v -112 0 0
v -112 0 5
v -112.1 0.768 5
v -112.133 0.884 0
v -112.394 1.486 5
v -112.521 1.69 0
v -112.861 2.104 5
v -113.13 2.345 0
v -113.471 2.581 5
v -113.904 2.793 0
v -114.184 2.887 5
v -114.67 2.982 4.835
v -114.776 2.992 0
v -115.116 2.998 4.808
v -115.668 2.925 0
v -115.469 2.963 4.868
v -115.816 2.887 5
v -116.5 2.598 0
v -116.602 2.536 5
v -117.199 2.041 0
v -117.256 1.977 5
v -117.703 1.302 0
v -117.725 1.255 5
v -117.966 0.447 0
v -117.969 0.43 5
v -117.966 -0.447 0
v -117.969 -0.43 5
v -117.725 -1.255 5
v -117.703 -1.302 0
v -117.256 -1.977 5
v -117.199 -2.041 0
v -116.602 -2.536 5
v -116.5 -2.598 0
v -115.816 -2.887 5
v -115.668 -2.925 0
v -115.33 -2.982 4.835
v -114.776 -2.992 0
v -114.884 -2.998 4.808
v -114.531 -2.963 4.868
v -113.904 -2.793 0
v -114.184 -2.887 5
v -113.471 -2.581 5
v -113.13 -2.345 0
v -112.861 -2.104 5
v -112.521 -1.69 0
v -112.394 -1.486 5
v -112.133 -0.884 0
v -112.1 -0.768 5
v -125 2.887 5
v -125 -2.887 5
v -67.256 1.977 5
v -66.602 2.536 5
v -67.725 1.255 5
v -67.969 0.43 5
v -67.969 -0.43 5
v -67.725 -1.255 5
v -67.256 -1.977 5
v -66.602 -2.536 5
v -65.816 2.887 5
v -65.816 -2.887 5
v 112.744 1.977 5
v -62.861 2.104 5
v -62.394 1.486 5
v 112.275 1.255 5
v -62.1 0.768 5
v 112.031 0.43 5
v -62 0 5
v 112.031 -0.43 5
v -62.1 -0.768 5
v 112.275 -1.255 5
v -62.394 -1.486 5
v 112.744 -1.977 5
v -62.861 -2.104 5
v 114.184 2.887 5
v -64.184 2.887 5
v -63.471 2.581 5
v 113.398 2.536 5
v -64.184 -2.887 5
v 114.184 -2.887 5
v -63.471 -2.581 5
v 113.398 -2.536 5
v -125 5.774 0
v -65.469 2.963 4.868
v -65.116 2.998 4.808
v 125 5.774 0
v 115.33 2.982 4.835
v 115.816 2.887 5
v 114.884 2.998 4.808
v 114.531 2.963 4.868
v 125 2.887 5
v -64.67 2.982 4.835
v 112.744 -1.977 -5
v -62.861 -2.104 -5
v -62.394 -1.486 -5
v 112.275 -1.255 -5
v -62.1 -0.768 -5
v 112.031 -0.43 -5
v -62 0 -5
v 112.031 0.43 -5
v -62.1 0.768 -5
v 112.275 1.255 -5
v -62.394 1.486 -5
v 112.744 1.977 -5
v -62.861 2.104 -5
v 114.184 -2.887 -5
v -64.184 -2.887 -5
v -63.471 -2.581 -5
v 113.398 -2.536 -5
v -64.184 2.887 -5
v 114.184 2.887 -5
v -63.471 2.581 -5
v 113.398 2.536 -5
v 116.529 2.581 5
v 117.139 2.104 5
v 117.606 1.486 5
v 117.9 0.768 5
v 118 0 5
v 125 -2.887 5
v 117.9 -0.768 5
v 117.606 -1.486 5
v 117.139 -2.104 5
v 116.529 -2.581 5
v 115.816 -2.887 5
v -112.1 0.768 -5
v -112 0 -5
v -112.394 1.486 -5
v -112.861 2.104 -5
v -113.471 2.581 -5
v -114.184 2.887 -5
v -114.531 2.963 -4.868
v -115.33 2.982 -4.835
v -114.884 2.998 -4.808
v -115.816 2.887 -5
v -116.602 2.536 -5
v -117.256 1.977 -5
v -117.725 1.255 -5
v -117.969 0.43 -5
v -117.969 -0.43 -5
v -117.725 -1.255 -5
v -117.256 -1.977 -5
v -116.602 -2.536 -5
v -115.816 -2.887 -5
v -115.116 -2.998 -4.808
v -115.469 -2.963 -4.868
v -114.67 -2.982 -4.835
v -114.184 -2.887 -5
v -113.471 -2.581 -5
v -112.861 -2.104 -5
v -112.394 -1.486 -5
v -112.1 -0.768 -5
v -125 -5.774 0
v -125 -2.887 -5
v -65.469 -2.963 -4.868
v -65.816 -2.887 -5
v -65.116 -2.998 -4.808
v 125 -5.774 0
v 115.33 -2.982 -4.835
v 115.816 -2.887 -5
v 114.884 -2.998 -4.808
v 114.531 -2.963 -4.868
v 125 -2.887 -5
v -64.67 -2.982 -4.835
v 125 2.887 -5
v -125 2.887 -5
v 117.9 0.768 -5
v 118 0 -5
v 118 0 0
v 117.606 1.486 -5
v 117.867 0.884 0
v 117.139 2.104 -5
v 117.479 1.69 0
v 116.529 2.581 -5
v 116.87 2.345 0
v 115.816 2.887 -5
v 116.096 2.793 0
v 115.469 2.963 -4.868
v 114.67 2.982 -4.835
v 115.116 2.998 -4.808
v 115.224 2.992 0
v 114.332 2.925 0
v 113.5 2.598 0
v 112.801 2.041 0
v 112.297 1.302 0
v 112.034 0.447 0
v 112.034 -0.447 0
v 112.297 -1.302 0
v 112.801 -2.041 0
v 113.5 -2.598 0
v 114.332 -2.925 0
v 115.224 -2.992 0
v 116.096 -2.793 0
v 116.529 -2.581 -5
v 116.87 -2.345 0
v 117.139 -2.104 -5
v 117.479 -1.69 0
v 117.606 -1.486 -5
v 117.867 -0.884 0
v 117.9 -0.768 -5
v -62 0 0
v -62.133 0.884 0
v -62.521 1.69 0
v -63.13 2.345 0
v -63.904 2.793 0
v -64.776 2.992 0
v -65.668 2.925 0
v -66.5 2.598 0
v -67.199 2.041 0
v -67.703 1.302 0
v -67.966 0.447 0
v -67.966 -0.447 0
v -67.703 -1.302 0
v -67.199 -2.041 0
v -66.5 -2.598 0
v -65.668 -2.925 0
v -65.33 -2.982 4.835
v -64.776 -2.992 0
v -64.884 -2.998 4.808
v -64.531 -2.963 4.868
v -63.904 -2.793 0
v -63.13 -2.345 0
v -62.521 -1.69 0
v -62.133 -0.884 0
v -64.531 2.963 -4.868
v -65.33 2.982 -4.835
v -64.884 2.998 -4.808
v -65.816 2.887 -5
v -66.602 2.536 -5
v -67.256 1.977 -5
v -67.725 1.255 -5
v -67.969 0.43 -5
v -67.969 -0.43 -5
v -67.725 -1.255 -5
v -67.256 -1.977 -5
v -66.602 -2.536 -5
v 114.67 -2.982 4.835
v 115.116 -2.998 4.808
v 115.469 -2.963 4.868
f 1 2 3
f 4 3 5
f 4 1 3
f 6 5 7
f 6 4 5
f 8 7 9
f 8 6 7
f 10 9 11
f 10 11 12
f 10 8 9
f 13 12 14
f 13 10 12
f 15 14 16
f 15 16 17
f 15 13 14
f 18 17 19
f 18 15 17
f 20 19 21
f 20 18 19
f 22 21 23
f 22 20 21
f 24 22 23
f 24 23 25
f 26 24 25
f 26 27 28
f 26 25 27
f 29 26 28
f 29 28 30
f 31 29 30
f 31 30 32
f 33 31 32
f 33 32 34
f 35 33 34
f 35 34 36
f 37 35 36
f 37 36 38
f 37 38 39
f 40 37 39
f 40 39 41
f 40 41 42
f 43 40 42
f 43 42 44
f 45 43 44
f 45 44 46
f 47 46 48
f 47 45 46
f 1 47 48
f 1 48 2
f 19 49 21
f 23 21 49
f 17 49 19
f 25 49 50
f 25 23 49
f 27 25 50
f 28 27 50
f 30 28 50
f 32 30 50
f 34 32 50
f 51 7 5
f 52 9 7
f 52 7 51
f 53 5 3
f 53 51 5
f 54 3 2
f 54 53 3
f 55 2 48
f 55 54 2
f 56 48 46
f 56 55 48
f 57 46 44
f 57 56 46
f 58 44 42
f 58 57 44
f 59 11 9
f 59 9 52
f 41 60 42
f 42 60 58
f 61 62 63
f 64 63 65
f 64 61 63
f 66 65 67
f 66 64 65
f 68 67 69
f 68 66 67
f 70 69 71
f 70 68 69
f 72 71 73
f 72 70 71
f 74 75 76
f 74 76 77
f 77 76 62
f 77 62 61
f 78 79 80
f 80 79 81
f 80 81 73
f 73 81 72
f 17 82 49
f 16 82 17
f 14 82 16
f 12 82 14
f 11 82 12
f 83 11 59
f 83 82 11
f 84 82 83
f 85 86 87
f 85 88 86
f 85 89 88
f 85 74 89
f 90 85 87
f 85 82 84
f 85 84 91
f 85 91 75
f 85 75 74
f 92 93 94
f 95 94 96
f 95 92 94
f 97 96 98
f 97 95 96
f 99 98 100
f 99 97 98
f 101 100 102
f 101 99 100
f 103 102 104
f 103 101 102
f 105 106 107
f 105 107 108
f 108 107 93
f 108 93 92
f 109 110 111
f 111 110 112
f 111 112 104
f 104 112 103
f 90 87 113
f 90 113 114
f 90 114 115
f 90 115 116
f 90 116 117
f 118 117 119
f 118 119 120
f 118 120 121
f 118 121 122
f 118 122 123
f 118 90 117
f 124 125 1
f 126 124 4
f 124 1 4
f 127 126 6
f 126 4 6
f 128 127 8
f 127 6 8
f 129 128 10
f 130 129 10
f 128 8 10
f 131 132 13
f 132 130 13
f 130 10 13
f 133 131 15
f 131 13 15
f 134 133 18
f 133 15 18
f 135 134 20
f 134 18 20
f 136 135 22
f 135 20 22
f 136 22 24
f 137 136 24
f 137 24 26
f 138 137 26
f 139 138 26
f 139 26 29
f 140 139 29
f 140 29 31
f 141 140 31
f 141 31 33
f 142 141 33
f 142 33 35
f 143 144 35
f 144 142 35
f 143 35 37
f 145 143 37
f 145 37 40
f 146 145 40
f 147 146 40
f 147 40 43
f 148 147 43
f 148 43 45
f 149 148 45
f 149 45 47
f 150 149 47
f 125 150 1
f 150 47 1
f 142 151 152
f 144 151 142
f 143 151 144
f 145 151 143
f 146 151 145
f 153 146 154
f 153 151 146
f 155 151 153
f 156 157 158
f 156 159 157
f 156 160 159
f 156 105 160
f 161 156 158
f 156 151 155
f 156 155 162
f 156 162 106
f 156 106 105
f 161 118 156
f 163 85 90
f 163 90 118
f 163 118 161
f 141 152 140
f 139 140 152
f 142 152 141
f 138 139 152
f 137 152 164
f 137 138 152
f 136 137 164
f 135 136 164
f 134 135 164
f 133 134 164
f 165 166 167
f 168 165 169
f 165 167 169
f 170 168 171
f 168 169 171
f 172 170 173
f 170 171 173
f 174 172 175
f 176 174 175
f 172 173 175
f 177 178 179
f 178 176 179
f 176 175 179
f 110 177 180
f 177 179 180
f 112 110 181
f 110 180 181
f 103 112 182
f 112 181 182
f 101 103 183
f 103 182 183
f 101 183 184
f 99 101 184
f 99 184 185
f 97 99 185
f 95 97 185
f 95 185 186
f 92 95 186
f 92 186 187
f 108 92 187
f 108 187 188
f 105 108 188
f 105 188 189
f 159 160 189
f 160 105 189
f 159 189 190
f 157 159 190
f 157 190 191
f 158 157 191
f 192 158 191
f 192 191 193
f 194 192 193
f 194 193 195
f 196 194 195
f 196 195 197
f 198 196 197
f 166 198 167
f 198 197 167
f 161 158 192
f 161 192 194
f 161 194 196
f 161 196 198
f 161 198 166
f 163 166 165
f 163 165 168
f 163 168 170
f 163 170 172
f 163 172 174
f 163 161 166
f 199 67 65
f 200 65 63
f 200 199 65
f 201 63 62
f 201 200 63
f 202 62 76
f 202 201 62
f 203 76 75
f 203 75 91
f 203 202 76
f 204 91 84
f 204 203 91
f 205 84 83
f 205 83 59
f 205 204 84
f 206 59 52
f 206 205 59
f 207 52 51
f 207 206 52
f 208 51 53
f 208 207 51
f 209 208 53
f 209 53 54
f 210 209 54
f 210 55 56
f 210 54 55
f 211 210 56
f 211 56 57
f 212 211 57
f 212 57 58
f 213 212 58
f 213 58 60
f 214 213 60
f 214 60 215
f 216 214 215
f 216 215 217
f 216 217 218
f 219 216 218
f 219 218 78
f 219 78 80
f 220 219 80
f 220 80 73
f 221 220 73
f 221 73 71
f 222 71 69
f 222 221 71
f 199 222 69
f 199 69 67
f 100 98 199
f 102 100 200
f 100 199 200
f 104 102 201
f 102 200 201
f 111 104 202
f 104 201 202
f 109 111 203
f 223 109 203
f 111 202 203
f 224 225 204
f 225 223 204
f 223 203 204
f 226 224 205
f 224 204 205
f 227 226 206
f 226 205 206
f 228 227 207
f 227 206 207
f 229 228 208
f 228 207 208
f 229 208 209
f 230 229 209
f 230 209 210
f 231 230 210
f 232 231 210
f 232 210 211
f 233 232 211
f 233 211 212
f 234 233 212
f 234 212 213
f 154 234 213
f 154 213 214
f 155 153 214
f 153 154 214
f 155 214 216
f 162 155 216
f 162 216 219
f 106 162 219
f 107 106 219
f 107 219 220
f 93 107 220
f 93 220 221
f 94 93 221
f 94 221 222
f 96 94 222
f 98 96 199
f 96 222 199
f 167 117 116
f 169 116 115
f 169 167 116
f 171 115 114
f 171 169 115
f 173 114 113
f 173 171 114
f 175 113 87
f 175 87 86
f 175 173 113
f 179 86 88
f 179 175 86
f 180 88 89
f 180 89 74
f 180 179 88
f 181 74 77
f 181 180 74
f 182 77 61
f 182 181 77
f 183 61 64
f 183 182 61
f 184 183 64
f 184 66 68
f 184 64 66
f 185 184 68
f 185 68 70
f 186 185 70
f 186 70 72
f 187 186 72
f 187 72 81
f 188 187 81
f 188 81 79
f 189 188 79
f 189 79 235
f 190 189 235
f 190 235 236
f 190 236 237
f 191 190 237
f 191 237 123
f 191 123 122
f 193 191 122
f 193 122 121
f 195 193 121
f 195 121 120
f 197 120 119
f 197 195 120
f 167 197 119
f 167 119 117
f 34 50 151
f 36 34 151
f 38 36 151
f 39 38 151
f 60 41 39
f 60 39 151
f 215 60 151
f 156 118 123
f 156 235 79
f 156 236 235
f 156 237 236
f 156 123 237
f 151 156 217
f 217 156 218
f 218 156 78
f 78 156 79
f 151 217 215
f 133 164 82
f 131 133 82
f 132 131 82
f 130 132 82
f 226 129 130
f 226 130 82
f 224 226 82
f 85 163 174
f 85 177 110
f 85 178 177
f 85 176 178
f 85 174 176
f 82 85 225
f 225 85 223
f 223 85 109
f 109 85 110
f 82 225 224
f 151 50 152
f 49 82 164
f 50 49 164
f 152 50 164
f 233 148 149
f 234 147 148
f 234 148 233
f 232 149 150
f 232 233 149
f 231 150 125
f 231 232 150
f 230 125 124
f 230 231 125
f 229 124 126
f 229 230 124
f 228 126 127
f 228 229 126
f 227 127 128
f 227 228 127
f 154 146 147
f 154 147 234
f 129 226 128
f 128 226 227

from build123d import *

# Parameters (mm, degrees)
BOSS_EXTRUDE1_DEPTH     = 125
SKETCH2_R               = 3
CUT_EXTRUDE1_DEPTH      = 6
CUT_EXTRUDE1_DEPTH_BACK = 6


with BuildPart() as part:
    # Sketch1 → Boss-Extrude1 (new body, symmetric)
    with BuildSketch(Plane(origin=(0, 0, 0), x_dir=(0, 0, -1), z_dir=(1, 0, 0))):
        Polygon((0, 5.773502692), (-5, 2.886751346), (-5, -2.886751346), (0, -5.773502692), (5, -2.886751346), (5, 2.886751346), align=None)
    extrude(amount=BOSS_EXTRUDE1_DEPTH, both=True)

    # Sketch2 → Cut-Extrude1 (cut, two sides)
    with BuildSketch(Plane.XY) as cut_extrude1_sk:
        with Locations((115, 0)):
            Circle(SKETCH2_R)
        with Locations((-115, 0)):
            Circle(SKETCH2_R)
        with Locations((-65, 0)):
            Circle(SKETCH2_R)
    extrude(amount=CUT_EXTRUDE1_DEPTH, mode=Mode.SUBTRACT)
    extrude(cut_extrude1_sk.sketch, amount=-CUT_EXTRUDE1_DEPTH_BACK, mode=Mode.SUBTRACT)


solid = part.part
